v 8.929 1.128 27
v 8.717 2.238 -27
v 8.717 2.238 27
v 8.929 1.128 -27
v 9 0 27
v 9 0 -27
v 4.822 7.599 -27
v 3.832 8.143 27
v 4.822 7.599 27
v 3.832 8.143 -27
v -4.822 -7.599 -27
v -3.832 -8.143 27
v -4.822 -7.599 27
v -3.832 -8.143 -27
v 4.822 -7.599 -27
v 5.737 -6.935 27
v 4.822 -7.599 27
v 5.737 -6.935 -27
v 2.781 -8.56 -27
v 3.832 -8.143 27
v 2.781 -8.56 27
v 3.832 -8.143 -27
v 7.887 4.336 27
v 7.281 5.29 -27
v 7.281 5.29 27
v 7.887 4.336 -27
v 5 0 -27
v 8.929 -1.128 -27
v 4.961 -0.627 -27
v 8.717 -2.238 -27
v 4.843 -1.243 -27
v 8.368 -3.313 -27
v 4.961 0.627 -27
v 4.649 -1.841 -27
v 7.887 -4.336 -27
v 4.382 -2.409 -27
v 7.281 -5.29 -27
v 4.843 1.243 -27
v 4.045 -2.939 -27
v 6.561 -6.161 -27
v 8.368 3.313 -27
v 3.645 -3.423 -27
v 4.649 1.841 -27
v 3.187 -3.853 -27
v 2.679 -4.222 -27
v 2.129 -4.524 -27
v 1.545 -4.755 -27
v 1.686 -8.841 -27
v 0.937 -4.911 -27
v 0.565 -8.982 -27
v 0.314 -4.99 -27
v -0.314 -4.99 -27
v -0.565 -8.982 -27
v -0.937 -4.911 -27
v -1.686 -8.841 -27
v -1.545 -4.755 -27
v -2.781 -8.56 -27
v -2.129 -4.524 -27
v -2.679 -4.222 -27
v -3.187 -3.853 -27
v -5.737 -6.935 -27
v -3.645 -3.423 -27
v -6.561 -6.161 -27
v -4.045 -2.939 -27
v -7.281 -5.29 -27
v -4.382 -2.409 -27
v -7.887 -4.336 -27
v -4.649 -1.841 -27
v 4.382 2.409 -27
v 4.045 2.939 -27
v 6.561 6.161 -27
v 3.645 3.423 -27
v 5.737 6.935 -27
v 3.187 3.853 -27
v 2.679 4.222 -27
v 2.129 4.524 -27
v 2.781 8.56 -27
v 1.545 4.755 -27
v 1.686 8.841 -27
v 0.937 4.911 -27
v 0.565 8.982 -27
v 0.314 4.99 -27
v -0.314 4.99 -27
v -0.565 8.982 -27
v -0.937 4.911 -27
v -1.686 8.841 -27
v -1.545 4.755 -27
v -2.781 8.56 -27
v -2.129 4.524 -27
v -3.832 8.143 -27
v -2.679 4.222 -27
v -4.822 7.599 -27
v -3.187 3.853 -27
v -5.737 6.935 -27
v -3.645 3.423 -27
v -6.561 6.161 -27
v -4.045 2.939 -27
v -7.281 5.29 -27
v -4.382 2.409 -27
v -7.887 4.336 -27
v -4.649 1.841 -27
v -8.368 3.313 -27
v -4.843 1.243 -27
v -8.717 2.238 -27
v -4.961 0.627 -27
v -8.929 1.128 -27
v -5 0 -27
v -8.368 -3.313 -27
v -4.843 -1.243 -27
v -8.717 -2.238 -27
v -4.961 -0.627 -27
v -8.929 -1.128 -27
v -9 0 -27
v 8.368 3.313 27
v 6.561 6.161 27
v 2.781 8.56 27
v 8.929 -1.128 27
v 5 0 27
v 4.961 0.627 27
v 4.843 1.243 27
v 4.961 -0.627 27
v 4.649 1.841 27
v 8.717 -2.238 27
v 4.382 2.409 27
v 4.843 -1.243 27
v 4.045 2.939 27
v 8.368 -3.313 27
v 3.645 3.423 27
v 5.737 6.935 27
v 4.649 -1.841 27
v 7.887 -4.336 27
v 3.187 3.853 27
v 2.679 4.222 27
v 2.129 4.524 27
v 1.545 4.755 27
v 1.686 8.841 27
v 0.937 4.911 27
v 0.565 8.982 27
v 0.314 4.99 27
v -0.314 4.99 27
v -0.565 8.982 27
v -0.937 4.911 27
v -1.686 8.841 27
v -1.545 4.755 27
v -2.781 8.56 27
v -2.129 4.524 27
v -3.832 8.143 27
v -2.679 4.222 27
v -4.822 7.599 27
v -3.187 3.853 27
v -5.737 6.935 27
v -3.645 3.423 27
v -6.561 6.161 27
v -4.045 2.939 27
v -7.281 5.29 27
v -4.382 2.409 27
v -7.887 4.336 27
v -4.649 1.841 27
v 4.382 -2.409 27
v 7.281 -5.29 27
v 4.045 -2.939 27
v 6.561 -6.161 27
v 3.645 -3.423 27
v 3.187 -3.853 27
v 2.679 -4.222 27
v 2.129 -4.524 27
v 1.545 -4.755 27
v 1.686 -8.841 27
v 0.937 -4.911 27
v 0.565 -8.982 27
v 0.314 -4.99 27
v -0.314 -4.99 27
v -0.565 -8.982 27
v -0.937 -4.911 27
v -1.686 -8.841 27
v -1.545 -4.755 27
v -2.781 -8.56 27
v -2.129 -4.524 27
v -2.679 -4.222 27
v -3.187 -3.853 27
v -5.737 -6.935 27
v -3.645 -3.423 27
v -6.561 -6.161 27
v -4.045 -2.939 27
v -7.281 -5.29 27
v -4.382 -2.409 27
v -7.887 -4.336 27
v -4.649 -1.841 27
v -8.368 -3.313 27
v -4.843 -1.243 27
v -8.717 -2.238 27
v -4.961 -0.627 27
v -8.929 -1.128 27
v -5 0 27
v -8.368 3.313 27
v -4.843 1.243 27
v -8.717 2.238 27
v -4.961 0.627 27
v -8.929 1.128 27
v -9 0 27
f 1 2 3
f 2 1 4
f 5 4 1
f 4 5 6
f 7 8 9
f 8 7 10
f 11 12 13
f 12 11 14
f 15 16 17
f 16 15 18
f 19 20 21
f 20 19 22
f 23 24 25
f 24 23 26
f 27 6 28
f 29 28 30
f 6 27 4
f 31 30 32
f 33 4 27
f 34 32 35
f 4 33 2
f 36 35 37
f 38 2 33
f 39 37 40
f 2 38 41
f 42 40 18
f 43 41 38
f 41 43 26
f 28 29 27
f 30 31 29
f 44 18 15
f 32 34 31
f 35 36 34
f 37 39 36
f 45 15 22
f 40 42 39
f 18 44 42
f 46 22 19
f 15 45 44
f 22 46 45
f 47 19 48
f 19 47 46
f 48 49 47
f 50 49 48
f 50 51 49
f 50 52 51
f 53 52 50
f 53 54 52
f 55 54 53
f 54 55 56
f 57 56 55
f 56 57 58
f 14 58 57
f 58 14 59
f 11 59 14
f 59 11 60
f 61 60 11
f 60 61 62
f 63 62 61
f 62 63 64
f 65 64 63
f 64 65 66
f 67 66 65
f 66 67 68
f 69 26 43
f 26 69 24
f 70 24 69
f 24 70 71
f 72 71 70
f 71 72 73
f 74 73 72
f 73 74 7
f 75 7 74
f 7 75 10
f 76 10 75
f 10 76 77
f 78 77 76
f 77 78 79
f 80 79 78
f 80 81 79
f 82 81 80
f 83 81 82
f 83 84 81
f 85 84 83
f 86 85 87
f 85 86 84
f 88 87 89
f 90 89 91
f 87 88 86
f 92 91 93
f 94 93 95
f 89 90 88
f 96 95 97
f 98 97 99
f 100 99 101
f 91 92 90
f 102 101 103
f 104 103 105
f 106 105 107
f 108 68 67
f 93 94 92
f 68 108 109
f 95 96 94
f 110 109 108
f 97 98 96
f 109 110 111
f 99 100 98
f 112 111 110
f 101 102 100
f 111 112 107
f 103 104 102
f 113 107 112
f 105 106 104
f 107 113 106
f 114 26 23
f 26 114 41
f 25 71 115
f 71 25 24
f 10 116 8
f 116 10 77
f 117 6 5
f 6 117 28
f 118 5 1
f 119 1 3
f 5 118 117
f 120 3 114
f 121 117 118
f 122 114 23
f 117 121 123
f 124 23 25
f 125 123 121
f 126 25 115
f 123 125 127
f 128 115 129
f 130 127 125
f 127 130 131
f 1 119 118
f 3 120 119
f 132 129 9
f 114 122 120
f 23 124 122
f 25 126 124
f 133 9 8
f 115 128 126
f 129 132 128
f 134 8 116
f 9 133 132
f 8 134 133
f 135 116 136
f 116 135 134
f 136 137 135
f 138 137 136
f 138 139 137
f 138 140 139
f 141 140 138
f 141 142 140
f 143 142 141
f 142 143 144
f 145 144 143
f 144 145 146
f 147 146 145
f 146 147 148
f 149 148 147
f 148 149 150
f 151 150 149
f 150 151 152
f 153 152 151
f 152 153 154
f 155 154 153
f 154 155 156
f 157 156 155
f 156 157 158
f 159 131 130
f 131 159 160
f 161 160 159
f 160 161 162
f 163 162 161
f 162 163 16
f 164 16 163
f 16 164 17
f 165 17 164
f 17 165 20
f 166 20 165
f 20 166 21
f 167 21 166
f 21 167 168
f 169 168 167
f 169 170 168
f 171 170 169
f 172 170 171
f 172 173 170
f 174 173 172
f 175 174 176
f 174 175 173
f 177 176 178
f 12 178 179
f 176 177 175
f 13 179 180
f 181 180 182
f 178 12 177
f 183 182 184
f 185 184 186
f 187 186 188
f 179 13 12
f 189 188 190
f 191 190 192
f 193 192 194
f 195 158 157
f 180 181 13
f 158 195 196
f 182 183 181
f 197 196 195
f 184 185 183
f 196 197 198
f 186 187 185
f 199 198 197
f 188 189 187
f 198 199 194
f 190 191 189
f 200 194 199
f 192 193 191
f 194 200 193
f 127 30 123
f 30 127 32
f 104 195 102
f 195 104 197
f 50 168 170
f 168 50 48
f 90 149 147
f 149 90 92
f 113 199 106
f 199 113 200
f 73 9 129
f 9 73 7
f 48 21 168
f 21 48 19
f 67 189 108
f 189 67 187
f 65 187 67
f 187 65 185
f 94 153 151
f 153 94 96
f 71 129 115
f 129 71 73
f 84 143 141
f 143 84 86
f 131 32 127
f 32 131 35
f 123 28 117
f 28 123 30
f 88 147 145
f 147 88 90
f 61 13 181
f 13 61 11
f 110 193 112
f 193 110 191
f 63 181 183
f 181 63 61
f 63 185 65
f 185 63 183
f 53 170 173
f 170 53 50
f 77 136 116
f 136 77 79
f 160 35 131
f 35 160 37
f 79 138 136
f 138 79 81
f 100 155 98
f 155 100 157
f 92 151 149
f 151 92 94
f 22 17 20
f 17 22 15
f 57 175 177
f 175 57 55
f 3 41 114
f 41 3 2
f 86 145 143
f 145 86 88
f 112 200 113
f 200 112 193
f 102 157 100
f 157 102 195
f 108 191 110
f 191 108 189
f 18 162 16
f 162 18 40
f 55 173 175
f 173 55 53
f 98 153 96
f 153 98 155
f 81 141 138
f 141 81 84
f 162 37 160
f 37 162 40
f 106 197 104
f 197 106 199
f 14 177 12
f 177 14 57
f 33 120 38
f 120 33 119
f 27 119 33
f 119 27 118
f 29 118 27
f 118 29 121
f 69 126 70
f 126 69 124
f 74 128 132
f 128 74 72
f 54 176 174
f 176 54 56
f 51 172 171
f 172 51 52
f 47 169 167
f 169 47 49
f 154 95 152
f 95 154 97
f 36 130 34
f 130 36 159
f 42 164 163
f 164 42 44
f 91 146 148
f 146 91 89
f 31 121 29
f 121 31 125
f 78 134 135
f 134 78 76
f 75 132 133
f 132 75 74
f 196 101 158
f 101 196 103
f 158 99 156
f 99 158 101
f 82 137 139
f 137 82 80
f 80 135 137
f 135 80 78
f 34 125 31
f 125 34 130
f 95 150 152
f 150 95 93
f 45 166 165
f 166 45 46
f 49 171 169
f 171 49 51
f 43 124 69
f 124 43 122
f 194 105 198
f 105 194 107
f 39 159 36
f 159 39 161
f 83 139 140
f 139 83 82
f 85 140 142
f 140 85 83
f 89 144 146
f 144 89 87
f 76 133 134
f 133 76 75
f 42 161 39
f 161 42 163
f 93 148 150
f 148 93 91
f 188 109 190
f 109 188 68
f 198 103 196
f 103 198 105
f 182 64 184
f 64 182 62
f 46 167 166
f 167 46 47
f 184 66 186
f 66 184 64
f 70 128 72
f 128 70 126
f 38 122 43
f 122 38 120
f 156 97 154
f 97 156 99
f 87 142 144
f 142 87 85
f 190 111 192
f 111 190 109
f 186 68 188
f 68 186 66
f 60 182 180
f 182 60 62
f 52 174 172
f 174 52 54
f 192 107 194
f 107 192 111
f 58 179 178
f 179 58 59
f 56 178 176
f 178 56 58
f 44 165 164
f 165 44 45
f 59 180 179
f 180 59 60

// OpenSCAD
$fn = 50;


difference() {
	union() {
		translate(v = [0, 0, -27.0000000000]) {
			cylinder(h = 54, r = 9.0000000000);
		}
	}
	union() {
		translate(v = [0, 0, -100.0000000000]) {
			cylinder(h = 200, r = 5.0000000000);
		}
	}
}
